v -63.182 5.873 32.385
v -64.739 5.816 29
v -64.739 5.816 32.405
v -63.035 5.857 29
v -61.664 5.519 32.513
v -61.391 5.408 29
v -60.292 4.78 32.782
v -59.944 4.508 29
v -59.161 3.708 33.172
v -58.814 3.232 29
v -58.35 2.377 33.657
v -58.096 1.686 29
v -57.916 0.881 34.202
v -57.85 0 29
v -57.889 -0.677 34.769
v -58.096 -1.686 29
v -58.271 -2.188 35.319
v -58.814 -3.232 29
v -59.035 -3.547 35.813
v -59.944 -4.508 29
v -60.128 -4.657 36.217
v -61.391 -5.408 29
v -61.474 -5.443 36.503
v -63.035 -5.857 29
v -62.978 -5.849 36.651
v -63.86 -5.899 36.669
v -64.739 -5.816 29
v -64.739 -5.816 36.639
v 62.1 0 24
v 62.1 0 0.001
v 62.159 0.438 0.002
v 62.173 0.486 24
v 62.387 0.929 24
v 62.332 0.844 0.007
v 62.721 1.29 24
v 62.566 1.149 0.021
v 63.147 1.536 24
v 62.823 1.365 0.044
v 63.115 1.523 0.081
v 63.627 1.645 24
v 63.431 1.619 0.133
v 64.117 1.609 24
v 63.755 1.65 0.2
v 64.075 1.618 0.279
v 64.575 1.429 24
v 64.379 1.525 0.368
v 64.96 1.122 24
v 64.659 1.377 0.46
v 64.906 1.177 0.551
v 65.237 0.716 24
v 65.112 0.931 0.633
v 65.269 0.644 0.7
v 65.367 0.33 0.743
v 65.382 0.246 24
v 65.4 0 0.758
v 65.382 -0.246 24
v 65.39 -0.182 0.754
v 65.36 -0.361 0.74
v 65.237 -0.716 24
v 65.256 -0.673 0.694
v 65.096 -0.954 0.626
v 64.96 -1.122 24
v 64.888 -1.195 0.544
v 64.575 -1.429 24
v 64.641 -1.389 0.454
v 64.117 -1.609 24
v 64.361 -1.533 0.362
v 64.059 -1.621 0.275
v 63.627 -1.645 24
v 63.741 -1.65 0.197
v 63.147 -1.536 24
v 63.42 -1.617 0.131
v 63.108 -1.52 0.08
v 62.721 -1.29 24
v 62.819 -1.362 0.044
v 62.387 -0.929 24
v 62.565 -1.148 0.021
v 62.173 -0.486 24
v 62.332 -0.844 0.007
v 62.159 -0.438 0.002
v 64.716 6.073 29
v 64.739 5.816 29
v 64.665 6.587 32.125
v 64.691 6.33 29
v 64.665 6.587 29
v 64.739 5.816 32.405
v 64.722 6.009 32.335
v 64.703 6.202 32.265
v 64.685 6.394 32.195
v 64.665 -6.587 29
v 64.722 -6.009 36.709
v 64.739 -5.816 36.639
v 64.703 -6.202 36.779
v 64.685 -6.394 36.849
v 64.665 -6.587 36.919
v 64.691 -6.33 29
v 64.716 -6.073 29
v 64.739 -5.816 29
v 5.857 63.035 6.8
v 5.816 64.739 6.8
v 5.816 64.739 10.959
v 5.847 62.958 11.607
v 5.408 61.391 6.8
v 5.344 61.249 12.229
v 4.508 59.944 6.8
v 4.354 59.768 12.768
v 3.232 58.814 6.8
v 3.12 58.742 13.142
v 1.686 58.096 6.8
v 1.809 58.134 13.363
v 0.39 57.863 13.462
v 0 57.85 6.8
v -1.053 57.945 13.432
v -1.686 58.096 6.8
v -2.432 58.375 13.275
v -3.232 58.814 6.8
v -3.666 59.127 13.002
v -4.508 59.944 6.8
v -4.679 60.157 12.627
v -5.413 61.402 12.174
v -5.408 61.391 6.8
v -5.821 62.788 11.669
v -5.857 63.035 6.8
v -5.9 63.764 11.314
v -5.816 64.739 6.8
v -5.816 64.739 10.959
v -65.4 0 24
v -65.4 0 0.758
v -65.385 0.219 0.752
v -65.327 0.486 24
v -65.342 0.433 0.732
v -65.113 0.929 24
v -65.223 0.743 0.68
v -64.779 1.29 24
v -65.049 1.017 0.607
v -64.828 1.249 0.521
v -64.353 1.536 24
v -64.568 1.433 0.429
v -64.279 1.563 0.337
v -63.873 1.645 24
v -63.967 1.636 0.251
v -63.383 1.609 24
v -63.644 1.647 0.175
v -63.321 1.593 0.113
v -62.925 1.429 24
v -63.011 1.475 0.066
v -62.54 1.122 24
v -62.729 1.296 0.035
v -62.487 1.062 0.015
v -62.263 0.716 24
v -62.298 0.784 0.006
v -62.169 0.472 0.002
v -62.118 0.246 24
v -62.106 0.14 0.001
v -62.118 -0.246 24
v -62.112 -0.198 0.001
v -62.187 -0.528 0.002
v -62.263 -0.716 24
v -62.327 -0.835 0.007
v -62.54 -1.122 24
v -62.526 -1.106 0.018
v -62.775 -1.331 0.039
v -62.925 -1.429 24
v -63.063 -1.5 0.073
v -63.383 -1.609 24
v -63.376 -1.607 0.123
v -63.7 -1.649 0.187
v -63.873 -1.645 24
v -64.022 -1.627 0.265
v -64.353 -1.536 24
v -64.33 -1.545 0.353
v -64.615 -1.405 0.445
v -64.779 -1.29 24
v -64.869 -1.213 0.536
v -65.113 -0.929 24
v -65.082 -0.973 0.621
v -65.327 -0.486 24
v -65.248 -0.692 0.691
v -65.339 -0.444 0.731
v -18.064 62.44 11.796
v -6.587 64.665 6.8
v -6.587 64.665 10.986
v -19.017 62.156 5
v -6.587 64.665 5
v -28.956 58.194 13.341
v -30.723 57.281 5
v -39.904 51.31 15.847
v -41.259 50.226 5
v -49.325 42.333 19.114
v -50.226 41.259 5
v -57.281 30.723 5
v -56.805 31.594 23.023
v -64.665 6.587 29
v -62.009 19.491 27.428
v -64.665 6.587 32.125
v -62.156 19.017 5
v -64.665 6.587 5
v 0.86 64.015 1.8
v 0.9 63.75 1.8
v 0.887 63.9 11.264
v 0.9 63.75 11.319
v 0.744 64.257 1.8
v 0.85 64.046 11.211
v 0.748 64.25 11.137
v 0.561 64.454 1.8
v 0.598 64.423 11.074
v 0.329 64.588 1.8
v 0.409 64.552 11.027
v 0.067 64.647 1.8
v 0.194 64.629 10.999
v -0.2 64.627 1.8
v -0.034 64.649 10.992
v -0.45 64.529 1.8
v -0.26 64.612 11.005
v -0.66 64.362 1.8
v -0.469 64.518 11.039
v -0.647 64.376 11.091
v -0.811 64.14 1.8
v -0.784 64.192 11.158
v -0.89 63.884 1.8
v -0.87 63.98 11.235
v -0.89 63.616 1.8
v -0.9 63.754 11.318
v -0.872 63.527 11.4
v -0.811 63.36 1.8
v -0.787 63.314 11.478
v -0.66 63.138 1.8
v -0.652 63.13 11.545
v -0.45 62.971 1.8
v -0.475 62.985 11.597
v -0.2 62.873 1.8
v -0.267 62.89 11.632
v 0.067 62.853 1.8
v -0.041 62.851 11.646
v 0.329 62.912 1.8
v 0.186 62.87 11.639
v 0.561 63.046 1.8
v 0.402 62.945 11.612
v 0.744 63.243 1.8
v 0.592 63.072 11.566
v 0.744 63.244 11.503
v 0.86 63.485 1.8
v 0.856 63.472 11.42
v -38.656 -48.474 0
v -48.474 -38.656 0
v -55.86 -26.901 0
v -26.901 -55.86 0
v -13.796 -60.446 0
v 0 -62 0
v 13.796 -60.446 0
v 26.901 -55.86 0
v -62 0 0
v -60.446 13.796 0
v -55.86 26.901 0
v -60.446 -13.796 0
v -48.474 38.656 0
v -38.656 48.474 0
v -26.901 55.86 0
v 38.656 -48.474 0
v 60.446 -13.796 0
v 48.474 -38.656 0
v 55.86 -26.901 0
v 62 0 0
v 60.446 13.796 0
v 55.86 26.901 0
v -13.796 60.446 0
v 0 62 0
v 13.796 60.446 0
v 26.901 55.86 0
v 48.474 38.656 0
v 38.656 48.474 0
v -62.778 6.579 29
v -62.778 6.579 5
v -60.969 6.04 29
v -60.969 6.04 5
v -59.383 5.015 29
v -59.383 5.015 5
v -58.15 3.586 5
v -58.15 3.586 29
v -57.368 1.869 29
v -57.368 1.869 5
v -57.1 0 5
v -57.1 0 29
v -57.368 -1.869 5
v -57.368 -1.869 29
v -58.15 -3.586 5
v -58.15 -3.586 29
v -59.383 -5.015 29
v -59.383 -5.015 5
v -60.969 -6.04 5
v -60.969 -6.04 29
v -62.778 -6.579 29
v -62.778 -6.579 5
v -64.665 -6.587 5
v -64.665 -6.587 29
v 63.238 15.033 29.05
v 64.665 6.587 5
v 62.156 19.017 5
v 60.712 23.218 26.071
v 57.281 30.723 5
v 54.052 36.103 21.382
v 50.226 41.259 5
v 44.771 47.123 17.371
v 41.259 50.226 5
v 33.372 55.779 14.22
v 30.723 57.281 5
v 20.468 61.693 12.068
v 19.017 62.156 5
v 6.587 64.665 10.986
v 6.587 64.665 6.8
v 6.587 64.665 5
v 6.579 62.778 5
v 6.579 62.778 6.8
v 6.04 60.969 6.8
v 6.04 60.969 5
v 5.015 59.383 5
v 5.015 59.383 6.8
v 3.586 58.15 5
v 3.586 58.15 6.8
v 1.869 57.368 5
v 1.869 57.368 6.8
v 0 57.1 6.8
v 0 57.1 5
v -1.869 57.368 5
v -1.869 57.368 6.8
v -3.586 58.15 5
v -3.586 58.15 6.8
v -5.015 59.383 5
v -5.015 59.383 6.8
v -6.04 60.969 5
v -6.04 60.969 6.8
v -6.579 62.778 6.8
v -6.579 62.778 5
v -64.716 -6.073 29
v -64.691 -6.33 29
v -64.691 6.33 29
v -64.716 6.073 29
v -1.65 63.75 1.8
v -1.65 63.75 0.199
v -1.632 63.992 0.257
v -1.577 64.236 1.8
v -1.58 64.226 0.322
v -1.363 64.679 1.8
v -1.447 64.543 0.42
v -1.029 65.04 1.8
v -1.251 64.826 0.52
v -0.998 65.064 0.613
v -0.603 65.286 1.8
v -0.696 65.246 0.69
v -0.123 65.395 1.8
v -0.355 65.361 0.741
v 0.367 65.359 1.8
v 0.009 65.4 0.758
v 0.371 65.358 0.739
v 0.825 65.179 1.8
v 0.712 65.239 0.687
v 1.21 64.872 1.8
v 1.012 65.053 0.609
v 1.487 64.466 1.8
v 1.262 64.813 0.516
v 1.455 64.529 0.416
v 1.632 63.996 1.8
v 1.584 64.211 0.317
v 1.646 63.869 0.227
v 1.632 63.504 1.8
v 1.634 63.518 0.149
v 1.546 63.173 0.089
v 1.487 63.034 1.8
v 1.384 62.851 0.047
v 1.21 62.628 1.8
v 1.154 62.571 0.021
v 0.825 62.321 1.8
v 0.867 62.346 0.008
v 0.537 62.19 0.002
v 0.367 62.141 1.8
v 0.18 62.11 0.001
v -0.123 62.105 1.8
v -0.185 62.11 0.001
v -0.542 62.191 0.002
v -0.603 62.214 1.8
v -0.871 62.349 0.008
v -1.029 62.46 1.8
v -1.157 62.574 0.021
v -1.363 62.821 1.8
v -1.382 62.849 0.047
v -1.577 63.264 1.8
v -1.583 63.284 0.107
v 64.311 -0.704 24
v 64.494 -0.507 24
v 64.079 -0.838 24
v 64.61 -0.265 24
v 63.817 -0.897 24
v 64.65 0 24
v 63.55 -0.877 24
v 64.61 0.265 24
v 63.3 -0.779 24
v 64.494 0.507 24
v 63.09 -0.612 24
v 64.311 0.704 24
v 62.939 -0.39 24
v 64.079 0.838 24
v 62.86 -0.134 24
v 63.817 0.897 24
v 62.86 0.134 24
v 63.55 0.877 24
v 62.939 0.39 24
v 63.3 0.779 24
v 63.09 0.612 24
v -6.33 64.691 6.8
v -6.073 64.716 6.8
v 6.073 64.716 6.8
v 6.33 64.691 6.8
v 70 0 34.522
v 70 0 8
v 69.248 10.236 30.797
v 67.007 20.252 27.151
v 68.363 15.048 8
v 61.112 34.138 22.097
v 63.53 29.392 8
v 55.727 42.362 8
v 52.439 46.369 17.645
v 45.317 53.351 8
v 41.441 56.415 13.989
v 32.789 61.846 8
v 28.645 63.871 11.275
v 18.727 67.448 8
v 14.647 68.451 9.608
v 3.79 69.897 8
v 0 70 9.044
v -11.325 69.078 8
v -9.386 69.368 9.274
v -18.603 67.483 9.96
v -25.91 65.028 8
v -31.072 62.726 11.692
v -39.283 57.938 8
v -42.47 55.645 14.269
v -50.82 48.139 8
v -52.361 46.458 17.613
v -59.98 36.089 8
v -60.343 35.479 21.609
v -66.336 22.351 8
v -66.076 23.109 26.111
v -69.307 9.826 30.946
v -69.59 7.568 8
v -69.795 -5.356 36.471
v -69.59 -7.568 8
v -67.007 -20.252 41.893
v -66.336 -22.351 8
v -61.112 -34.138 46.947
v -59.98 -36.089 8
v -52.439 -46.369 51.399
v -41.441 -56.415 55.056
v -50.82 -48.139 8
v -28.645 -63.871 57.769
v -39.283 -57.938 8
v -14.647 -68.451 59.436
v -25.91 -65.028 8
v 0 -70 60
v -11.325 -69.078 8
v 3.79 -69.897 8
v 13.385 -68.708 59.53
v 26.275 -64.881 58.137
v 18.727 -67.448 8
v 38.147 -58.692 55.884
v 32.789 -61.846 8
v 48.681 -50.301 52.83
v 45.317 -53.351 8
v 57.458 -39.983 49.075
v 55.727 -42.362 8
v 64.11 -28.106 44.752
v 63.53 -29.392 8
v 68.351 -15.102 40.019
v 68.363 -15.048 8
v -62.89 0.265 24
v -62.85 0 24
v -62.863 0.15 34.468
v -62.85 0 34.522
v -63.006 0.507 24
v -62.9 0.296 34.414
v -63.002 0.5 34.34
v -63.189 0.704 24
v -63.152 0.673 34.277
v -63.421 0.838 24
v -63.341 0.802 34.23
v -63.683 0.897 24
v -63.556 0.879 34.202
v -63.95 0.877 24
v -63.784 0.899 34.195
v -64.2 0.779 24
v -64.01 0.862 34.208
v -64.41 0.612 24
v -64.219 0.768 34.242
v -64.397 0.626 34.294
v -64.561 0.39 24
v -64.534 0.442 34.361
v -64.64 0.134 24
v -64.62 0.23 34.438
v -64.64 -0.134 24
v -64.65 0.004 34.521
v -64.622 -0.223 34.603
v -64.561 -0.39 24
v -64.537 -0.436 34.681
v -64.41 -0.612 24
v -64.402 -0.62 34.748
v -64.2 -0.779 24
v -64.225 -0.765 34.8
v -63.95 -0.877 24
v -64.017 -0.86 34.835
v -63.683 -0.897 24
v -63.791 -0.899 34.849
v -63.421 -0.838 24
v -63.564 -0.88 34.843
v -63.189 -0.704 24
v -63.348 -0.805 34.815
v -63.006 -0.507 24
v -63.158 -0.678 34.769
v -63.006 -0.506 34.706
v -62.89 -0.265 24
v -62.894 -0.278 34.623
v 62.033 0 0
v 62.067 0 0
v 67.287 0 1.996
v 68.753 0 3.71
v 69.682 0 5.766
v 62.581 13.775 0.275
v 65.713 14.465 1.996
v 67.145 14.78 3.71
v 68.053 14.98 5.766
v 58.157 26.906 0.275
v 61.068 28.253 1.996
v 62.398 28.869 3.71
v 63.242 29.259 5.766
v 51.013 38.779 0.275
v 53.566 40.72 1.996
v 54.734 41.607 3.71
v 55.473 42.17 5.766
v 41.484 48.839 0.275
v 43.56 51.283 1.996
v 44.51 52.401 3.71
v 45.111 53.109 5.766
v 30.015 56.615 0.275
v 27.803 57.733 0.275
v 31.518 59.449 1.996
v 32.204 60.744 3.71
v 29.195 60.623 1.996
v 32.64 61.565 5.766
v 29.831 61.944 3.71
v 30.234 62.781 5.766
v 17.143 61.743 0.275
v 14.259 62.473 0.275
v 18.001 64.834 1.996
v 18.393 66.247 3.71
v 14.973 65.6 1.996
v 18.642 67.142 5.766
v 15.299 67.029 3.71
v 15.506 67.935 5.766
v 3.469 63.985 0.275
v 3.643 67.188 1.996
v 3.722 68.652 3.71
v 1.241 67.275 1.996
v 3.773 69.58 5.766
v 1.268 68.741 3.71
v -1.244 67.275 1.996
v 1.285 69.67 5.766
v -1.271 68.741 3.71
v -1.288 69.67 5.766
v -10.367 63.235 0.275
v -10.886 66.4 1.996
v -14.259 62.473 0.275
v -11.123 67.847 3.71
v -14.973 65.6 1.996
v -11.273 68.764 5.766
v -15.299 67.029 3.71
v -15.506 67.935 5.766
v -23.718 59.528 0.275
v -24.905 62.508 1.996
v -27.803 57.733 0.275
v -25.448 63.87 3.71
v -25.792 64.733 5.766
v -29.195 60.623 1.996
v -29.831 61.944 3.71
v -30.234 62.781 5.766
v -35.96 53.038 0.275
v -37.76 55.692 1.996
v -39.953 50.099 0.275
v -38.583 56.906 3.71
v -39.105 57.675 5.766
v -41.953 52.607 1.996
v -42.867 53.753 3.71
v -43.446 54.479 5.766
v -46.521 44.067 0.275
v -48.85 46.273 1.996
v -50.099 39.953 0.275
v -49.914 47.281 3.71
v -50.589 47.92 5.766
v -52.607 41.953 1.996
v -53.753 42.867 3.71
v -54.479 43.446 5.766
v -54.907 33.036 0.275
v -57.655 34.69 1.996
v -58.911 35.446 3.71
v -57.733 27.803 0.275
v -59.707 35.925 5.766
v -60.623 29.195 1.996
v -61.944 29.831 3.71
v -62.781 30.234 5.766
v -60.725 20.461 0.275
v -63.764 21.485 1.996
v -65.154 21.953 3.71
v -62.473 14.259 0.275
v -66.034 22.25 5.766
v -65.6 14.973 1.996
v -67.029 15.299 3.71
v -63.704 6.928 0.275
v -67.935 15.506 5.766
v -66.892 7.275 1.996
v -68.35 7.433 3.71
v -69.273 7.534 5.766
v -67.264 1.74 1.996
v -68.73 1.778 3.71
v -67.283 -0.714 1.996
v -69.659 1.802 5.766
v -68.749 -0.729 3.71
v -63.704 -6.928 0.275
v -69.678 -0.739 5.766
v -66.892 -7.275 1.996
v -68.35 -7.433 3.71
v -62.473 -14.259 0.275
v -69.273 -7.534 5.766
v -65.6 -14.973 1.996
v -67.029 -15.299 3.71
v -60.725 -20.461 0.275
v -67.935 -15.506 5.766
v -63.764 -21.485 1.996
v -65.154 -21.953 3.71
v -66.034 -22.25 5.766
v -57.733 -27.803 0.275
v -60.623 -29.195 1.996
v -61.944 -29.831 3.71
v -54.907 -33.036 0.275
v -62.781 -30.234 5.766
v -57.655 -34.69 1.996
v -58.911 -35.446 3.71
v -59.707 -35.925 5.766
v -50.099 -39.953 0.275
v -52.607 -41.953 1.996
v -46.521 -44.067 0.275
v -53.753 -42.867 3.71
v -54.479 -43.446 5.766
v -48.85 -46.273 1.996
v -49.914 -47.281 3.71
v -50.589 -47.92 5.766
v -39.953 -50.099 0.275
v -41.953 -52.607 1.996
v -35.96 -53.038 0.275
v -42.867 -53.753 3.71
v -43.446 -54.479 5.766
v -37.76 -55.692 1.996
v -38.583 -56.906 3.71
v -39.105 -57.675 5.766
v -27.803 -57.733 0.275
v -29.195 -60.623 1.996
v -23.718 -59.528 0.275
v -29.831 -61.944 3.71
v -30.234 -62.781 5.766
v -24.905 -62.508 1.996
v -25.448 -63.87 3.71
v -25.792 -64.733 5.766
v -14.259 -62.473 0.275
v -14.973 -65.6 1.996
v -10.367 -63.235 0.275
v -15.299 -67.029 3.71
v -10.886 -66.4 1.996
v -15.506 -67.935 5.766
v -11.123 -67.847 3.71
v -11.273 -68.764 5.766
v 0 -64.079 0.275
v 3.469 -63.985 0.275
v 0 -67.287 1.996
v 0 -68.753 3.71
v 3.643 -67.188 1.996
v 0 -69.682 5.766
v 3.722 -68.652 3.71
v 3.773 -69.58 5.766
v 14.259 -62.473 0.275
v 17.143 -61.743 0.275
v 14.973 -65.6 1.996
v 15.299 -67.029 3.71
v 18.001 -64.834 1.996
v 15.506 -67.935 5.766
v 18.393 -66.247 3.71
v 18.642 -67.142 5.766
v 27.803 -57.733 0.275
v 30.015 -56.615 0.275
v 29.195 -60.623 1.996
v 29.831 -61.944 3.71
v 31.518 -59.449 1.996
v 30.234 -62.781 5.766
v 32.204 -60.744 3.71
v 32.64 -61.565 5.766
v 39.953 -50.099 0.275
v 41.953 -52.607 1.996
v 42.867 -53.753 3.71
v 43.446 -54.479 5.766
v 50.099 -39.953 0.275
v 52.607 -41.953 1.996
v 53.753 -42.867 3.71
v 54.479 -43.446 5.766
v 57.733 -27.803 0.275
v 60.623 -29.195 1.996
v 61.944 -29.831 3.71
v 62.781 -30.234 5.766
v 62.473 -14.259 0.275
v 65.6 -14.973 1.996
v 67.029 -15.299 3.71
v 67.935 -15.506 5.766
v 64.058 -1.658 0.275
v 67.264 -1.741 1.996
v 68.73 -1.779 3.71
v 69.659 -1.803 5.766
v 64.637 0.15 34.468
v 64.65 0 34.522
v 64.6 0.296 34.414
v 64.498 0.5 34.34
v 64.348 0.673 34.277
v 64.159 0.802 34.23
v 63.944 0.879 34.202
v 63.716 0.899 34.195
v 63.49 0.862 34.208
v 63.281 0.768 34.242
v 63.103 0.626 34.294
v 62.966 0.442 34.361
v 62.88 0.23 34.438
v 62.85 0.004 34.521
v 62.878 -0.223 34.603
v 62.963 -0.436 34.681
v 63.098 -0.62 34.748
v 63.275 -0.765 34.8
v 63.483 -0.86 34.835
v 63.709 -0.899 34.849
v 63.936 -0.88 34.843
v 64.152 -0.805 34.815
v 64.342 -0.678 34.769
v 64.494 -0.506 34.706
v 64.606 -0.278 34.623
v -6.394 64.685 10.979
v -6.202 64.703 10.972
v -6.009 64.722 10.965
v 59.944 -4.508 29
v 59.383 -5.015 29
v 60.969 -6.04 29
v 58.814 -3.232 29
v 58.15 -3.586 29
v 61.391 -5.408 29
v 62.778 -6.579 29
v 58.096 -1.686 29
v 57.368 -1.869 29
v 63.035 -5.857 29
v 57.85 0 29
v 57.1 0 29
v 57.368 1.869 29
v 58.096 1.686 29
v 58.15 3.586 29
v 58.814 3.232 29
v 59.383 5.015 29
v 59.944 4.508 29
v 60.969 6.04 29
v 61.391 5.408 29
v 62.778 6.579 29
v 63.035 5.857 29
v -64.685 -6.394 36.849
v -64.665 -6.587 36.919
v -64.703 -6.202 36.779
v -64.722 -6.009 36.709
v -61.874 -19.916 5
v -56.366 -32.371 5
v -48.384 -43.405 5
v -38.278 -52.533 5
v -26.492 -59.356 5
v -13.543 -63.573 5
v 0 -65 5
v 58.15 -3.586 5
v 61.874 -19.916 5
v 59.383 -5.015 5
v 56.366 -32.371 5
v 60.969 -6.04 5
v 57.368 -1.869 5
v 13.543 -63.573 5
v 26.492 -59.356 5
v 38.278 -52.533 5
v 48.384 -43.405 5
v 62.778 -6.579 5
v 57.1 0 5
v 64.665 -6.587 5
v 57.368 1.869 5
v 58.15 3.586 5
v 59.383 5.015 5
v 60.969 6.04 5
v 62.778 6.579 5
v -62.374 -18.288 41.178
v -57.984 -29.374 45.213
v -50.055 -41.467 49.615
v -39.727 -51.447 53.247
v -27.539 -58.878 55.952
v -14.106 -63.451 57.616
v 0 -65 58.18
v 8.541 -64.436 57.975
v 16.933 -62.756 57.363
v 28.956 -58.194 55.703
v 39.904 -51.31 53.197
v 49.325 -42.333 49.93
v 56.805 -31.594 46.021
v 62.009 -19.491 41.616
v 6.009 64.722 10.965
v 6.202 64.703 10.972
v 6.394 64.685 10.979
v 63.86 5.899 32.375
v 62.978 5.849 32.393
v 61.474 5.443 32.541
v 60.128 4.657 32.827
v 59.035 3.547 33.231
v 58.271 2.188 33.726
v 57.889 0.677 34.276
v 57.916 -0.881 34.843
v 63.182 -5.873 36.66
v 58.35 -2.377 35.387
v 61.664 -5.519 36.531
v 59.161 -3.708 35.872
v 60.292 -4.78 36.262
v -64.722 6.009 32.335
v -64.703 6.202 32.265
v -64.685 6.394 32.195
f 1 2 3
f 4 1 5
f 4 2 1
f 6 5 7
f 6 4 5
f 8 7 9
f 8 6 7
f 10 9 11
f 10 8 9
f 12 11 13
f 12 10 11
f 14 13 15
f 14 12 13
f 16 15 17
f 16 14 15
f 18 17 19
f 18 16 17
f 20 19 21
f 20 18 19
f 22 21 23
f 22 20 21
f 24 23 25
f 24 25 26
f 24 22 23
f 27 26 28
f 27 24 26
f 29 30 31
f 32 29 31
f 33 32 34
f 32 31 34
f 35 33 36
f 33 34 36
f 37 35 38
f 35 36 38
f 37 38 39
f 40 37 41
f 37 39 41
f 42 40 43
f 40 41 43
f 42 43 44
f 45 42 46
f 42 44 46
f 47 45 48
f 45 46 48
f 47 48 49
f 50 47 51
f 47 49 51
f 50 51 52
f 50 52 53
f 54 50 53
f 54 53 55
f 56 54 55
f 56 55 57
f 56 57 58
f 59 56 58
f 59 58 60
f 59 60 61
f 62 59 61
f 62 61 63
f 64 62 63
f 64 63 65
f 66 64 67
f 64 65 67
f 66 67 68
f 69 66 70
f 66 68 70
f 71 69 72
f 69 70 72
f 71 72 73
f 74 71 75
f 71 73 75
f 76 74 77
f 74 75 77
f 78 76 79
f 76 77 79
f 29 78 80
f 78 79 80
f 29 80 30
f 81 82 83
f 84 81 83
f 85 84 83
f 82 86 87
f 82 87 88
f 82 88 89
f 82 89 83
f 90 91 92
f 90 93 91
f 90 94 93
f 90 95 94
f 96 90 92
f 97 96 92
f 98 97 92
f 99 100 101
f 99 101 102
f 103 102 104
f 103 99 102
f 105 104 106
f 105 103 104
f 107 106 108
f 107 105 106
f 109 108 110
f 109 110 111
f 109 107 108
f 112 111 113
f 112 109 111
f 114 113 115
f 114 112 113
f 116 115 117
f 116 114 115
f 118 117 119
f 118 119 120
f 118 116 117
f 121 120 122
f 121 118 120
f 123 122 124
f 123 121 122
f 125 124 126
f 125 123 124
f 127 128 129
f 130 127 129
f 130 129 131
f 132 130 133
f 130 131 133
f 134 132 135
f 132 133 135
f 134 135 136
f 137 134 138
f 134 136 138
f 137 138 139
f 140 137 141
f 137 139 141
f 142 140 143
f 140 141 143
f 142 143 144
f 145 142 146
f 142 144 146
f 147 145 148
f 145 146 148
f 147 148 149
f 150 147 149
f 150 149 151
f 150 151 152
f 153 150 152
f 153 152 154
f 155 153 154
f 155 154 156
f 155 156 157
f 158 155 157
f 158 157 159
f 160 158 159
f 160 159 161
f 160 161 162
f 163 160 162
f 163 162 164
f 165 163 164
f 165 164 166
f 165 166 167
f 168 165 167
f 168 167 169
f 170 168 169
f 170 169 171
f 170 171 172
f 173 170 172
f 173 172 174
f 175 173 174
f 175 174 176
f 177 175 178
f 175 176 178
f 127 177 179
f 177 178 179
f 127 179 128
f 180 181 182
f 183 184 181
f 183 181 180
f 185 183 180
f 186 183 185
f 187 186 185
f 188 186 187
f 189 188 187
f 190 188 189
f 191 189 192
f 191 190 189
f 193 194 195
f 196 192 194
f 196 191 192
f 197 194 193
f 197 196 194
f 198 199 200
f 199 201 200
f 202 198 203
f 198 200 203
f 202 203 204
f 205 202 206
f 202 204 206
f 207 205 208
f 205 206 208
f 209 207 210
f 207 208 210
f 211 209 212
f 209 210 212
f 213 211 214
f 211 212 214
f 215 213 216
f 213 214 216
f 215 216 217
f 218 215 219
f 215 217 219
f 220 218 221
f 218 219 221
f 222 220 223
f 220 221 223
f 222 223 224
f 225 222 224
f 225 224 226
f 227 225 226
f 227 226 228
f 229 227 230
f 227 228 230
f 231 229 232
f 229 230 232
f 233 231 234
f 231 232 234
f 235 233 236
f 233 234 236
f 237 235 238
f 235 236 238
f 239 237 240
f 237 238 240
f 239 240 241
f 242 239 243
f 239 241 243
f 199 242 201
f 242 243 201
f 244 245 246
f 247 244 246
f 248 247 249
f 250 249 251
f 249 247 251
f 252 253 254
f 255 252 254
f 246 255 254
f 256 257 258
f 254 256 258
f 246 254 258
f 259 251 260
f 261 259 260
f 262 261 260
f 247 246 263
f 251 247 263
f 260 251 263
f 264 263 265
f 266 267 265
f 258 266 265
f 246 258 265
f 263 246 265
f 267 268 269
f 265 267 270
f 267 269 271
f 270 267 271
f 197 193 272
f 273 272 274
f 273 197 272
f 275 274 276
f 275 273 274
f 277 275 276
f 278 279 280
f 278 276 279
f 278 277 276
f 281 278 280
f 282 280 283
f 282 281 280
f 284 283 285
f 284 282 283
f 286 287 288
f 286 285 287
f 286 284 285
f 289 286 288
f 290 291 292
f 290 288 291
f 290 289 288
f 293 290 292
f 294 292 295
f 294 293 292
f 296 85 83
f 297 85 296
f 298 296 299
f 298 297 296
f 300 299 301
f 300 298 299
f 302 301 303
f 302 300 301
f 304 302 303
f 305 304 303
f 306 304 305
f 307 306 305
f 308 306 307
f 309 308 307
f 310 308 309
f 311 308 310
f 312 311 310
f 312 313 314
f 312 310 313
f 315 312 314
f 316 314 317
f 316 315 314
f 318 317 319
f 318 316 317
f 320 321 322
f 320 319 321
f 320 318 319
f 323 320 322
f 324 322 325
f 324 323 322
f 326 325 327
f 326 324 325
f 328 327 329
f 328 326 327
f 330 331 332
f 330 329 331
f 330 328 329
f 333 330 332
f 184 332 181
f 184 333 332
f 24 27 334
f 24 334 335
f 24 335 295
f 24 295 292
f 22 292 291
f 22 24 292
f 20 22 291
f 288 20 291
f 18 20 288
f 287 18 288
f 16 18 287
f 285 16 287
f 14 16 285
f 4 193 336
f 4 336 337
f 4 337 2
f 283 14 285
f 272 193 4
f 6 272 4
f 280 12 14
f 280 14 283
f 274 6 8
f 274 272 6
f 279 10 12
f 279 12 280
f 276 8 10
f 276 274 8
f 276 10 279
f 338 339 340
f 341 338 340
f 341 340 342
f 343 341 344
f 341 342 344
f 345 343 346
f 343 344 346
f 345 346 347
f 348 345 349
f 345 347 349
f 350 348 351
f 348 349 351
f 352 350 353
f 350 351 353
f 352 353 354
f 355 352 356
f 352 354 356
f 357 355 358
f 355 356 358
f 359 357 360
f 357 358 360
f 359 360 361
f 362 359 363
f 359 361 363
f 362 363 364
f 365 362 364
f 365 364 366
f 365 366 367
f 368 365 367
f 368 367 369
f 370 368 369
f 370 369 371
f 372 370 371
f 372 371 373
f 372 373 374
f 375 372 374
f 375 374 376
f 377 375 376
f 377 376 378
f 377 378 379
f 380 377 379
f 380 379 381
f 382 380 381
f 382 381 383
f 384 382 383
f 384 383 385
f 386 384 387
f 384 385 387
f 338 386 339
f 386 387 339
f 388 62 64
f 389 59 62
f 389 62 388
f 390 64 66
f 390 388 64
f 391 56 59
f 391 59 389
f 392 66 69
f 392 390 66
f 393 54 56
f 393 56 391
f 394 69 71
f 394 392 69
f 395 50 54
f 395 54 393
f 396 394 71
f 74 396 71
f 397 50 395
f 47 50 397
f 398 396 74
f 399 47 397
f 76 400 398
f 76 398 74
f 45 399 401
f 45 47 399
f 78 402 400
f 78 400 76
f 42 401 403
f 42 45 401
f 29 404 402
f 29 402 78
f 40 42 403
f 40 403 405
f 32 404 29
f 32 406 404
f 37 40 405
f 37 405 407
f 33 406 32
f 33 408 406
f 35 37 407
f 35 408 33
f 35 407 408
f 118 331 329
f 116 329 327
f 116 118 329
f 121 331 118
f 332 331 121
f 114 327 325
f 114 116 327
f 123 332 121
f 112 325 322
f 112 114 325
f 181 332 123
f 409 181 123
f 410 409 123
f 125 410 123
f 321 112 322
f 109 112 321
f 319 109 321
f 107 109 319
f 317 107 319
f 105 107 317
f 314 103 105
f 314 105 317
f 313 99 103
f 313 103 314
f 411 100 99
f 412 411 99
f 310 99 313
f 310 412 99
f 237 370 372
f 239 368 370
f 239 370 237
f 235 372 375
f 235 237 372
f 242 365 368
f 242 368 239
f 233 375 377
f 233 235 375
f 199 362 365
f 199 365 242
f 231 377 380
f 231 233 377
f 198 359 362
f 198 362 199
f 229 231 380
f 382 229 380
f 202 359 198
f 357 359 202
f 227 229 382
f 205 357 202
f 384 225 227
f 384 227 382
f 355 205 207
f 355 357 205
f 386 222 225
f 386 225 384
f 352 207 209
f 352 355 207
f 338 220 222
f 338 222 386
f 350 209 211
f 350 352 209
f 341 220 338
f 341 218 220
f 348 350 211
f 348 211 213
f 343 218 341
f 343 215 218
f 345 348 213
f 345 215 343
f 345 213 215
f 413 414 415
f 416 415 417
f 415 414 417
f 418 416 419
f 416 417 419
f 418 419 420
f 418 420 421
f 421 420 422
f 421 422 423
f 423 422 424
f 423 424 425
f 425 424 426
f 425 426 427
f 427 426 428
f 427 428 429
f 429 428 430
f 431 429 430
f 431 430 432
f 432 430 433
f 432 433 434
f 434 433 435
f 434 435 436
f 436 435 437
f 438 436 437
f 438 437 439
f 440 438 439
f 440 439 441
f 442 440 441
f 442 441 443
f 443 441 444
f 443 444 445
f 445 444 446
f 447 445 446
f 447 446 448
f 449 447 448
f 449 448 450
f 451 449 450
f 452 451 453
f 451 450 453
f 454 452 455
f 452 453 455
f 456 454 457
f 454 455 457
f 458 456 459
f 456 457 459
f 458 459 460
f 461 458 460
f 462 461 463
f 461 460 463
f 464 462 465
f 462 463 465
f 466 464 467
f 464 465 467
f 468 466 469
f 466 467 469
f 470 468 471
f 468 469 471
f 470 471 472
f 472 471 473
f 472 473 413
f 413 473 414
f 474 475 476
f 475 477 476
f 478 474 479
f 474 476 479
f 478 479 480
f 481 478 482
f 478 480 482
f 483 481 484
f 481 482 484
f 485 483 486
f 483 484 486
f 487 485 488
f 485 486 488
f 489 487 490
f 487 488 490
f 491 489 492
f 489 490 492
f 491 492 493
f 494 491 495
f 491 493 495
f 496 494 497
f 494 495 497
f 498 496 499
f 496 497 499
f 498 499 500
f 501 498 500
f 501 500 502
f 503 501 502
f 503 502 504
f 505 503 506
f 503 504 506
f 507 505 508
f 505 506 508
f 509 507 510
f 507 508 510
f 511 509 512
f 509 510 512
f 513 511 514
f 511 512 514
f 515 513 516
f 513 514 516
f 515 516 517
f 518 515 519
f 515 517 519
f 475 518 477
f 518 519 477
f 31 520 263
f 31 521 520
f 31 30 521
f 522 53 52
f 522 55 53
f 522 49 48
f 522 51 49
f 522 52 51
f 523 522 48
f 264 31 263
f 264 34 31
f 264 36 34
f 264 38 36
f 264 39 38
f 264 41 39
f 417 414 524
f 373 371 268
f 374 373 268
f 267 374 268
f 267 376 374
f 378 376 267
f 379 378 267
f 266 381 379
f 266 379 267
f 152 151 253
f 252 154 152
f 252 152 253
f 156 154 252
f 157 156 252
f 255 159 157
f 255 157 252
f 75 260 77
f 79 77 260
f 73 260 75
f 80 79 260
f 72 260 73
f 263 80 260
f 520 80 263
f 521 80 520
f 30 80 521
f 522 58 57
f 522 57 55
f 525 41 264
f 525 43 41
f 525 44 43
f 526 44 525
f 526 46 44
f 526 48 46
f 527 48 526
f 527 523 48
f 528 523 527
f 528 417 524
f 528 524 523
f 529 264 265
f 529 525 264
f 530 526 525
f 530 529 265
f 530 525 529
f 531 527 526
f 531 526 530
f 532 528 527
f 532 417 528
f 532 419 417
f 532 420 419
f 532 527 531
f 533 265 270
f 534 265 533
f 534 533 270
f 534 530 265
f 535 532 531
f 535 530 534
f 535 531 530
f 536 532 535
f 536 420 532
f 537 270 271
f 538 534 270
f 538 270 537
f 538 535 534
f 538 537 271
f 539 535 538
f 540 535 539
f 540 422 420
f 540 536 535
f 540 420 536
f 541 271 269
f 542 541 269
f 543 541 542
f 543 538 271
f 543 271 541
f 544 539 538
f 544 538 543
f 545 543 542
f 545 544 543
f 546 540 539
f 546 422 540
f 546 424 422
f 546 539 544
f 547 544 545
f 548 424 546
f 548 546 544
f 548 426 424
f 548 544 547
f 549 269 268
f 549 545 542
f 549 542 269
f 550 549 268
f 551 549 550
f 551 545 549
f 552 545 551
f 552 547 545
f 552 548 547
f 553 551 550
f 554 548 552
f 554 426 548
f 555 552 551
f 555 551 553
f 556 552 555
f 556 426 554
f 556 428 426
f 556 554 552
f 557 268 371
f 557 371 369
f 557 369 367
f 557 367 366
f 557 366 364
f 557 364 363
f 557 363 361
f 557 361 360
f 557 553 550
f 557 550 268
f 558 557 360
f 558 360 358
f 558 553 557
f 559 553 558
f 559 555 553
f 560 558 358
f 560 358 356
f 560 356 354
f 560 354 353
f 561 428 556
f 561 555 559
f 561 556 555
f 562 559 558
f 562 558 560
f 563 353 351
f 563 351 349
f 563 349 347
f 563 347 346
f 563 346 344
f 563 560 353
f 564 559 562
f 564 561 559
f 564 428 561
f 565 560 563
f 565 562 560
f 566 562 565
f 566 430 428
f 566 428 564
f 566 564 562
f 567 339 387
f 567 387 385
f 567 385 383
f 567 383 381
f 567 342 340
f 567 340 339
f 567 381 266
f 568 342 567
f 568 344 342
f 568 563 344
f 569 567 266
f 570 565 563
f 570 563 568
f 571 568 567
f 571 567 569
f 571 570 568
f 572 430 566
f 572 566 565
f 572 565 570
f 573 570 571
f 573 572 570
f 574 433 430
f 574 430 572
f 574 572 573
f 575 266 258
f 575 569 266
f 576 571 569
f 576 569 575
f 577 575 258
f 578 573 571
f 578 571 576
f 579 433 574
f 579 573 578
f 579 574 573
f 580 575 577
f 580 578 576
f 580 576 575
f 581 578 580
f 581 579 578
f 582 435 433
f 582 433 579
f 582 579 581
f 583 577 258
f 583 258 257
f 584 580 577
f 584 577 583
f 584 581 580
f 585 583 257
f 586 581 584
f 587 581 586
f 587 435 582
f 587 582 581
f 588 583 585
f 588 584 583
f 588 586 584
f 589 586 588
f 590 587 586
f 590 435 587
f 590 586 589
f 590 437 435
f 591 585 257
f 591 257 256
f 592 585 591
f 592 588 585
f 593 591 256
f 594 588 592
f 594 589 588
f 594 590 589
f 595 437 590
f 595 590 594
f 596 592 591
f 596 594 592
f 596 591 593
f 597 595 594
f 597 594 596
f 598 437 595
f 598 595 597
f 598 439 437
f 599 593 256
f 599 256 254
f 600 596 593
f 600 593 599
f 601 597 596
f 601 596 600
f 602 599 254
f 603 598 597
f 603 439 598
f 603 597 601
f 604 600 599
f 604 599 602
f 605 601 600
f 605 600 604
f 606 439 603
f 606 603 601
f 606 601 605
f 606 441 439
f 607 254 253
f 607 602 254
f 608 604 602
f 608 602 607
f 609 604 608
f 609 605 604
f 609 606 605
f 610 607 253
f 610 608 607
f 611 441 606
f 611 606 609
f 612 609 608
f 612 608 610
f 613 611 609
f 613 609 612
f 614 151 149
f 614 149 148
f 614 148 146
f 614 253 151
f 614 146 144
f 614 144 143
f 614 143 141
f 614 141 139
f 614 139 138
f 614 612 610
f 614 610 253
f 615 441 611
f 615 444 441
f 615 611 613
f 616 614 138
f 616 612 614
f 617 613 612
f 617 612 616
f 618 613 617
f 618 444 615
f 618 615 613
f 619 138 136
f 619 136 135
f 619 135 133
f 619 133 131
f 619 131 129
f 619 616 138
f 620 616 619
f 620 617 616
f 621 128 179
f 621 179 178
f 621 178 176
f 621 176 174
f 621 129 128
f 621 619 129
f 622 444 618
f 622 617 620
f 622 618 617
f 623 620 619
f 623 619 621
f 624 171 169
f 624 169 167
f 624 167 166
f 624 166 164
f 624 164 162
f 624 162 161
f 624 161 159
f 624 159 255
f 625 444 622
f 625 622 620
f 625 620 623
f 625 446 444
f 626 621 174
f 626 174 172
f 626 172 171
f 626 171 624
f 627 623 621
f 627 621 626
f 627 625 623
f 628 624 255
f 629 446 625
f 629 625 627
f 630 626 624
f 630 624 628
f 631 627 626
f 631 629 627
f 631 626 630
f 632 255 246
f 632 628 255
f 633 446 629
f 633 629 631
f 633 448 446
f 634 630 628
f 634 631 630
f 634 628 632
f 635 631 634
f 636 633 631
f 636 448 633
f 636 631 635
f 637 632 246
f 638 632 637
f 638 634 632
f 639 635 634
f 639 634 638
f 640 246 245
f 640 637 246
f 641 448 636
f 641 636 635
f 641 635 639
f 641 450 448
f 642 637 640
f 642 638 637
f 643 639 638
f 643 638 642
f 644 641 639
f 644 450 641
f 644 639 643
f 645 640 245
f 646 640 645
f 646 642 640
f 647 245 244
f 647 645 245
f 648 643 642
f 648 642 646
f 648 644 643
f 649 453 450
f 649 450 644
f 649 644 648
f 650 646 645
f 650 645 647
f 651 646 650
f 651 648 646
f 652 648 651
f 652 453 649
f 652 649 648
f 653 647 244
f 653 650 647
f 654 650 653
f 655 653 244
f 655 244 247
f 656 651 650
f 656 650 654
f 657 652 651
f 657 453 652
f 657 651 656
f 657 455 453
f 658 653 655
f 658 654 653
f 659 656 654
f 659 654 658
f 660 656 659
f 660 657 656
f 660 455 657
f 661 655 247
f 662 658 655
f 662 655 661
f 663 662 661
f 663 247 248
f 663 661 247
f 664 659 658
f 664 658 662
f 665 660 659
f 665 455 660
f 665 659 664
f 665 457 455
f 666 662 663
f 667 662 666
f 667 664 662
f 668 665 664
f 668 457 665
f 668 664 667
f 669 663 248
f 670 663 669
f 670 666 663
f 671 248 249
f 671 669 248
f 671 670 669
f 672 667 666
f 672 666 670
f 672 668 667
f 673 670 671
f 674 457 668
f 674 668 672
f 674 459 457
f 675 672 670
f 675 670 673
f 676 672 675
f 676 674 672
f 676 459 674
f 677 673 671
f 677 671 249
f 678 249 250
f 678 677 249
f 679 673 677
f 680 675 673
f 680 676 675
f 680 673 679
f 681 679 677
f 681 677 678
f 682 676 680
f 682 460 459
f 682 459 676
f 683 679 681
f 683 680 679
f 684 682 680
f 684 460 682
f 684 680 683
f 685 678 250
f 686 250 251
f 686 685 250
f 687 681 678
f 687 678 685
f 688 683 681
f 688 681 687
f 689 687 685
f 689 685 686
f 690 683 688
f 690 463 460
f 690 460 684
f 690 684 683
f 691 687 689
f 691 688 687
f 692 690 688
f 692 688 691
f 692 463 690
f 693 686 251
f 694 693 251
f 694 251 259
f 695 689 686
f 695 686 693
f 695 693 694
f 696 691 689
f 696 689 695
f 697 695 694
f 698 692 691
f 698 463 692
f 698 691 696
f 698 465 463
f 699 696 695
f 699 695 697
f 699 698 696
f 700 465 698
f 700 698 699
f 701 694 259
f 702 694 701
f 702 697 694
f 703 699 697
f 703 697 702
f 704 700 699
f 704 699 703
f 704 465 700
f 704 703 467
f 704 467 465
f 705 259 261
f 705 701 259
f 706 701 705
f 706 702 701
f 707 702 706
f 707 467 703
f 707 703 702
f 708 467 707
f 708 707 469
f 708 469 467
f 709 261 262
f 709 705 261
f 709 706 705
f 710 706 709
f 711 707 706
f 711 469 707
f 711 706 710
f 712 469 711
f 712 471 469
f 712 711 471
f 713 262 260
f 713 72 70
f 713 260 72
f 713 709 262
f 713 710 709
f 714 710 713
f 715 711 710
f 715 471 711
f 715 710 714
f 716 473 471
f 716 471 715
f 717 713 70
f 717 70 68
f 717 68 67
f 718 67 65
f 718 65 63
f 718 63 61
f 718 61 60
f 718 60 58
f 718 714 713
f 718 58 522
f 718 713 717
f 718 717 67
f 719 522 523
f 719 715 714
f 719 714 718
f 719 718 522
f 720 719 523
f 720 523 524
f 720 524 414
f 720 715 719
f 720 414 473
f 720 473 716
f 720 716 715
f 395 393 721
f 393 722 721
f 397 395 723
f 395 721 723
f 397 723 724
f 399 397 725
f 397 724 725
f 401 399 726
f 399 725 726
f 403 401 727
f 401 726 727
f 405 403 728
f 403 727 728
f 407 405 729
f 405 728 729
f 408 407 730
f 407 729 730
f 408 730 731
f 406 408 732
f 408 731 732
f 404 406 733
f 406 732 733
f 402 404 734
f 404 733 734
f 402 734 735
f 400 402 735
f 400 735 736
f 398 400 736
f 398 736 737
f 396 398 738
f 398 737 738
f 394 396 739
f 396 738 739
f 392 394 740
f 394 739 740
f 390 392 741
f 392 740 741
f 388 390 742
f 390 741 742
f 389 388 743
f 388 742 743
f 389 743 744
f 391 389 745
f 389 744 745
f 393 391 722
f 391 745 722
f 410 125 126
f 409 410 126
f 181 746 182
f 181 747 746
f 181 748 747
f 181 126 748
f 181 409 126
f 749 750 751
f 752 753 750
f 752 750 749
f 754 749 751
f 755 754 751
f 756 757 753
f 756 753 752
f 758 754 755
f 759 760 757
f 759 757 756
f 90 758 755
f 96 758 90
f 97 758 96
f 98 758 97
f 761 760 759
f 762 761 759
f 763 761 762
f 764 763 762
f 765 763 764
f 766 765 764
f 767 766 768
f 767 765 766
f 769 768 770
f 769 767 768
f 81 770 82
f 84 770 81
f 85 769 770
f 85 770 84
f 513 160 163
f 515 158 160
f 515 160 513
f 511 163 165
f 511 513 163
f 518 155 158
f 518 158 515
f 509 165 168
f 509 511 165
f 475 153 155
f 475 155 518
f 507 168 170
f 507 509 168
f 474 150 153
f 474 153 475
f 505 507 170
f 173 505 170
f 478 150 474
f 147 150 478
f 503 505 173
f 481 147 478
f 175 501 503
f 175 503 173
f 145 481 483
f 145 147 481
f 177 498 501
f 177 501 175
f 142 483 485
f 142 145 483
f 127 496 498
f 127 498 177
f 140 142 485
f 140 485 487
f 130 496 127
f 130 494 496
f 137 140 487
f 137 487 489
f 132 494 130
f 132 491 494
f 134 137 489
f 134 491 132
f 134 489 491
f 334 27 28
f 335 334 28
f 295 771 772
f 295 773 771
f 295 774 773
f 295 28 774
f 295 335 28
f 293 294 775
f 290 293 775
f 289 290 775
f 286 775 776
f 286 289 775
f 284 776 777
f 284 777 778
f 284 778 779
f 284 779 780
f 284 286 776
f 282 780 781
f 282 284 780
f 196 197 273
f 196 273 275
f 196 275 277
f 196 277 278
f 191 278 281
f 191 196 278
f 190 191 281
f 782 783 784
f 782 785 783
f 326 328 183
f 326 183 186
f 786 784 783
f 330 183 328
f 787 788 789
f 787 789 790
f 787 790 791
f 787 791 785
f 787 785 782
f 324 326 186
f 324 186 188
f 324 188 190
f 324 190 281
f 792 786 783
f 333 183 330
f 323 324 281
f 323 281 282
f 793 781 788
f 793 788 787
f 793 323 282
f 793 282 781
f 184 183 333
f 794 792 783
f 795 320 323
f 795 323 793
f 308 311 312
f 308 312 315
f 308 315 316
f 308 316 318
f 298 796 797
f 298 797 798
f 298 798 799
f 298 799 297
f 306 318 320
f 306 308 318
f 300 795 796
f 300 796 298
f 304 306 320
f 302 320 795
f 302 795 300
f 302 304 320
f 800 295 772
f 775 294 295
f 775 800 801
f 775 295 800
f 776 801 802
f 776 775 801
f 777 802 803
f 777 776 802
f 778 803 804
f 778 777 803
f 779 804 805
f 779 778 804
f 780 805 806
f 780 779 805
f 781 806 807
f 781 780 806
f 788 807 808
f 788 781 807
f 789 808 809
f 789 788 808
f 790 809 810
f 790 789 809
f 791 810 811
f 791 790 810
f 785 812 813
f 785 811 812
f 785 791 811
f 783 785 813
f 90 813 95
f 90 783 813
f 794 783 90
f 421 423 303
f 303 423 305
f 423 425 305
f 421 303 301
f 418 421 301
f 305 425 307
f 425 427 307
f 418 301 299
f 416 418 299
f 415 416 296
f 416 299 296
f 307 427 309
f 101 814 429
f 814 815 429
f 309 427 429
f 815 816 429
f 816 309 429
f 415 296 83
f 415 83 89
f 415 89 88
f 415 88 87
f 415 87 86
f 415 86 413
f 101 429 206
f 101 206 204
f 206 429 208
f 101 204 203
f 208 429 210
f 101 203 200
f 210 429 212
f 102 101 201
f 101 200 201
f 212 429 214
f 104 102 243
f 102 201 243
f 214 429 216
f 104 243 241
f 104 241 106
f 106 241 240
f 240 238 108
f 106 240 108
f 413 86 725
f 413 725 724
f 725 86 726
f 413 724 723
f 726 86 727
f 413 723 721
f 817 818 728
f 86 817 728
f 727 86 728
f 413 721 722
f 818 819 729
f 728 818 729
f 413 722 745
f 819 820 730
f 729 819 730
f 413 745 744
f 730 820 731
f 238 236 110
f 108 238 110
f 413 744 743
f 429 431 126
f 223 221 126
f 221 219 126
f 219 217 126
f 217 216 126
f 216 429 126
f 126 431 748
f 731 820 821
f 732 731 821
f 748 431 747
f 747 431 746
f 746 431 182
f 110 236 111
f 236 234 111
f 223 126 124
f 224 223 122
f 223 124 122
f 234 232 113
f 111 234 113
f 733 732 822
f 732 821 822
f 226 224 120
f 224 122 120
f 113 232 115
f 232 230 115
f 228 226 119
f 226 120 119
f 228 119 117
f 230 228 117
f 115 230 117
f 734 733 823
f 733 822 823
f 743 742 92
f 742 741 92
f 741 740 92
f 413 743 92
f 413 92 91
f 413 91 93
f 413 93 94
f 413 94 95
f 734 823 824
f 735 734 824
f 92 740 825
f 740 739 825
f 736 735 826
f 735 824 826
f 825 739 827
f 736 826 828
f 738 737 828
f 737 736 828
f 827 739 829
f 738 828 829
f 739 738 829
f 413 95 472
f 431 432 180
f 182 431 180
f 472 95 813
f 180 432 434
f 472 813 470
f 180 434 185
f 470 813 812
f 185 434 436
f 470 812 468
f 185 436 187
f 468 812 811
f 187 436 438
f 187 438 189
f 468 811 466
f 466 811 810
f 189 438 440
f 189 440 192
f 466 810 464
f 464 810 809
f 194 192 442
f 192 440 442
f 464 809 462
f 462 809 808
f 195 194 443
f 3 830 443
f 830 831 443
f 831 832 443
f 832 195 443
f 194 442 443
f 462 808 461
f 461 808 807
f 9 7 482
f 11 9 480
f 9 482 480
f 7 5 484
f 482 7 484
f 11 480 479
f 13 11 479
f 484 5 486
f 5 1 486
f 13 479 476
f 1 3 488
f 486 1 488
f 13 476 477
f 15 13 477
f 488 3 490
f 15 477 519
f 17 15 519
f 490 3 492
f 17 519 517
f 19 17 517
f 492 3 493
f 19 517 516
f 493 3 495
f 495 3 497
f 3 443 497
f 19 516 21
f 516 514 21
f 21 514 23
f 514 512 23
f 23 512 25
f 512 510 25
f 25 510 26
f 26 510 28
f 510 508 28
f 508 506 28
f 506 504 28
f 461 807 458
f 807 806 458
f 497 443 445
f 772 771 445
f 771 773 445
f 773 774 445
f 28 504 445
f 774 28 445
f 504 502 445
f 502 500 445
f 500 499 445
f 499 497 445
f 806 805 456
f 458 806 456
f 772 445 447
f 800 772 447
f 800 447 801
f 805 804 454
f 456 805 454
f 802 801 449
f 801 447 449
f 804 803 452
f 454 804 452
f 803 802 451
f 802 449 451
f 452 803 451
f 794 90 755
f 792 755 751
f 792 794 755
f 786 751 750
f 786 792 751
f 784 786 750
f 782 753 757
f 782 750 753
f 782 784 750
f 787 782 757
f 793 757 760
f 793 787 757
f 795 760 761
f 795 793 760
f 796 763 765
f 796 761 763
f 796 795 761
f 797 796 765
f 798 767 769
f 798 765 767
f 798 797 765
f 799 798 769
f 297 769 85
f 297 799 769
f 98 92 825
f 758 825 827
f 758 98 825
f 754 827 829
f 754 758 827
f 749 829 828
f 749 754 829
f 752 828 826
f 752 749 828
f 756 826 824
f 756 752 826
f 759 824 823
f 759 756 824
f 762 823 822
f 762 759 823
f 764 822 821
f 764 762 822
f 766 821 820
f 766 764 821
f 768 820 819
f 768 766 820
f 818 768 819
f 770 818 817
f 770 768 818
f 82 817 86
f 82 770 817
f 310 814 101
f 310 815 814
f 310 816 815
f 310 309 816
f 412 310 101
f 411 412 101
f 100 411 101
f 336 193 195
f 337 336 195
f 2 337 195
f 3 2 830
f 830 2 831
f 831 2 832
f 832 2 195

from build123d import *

# Parameters (mm, degrees)
SKETCH_1_R                = 70
EXTRUDE_1_DEPTH           = 60
CUT_EXTRUDE_1_DEPTH       = 116.758369028
CUT_EXTRUDE_1_DEPTH_BACK  = 116.758369028
HOLE_WIZARD_1_D           = 1.8
HOLE_WIZARD_1_CBORE_D     = 3.3
HOLE_WIZARD_1_CBORE_DEPTH = 1.8
HOLE_WIZARD_2_D           = 1.8
HOLE_WIZARD_2_CBORE_D     = 3.3
HOLE_WIZARD_2_CBORE_DEPTH = 24
SHELL_START               = 5
SHELL_1_DEPTH             = 53.180148829
SHELL_START_2             = 29
SHELL_1_2_DEPTH           = 29.180148829
SHELL_START_3             = 6.8
SHELL_1_3_DEPTH           = 22.2
FILLET_2_R                = 8


# Read off the part's stored shape, not the designer's step: 抽壳1
with BuildPart() as part:
    # 草图1 → 凸台-拉伸1 (new body)
    with BuildSketch(Plane.XY):
        Circle(SKETCH_1_R)
    extrude(amount=EXTRUDE_1_DEPTH)

    # 草图2 → 切除-拉伸1 (cut, two sides: drawn at the far end of the back side and taken through both)
    with BuildSketch(Plane(origin=(0, 0, 0), x_dir=(0, 0, -1), z_dir=(1, 0, 0)).offset(-CUT_EXTRUDE_1_DEPTH_BACK)):
        Polygon((-60, -70), (-60, 70), (-9.044167203, 70), align=None)
    extrude(amount=CUT_EXTRUDE_1_DEPTH + CUT_EXTRUDE_1_DEPTH_BACK, mode=Mode.SUBTRACT)

    # 打孔尺寸(%根据)内六角圆柱头螺钉的类型1 (through all)
    with Locations(Plane(origin=(0, 0, 0), x_dir=(-1, 0, 0), z_dir=(0, 0, -1))):
        with Locations((0, 63.75)):
            CounterBoreHole(HOLE_WIZARD_1_D / 2, HOLE_WIZARD_1_CBORE_D / 2, HOLE_WIZARD_1_CBORE_DEPTH)

    # 打孔尺寸(%根据)内六角圆柱头螺钉的类型2 (through all)
    with Locations(Plane(origin=(0, 0, 0), x_dir=(-1, 0, 0), z_dir=(0, 0, -1))):
        with Locations((-63.75, 0), (63.75, 0)):
            CounterBoreHole(HOLE_WIZARD_2_D / 2, HOLE_WIZARD_2_CBORE_D / 2, HOLE_WIZARD_2_CBORE_DEPTH)

    # 抽壳1 outline → 抽壳1 (cut)
    with BuildSketch(Plane.XY.offset(SHELL_START)):
        with BuildLine():
            ThreePointArc((-64.665411765, -6.586692744), (0, -65), (64.665411765, -6.586692744))
            ThreePointArc((64.665411765, -6.586692744), (57.1, 0), (64.665411765, 6.586692744))
            ThreePointArc((64.665411765, 6.586692744), (45.961940777, 45.961940777), (6.586692744, 64.665411765))
            ThreePointArc((6.586692744, 64.665411765), (0, 57.1), (-6.586692744, 64.665411765))
            ThreePointArc((-6.586692744, 64.665411765), (-45.961940777, 45.961940777), (-64.665411765, 6.586692744))
            ThreePointArc((-64.665411765, 6.586692744), (-57.1, 0), (-64.665411765, -6.586692744))
        make_face()
    extrude(amount=SHELL_1_DEPTH, mode=Mode.SUBTRACT)

    # Shell 1 2 outline → Shell 1 2 (cut)
    with BuildSketch(Plane.XY.offset(SHELL_START_2)):
        with BuildLine():
            ThreePointArc((64.665411765, -6.586692744), (64.703469597, -6.2016951), (64.739235294, -5.81647776))
            ThreePointArc((64.739235294, -5.81647776), (57.85, 0), (64.739235294, 5.81647776))
            ThreePointArc((64.739235294, 5.81647776), (64.703469597, 6.2016951), (64.665411765, 6.586692744))
            ThreePointArc((64.665411765, 6.586692744), (57.1, 0), (64.665411765, -6.586692744))
        make_face()
        with BuildLine():
            ThreePointArc((-64.739235294, -5.81647776), (-64.703469597, -6.2016951), (-64.665411765, -6.586692744))
            ThreePointArc((-64.665411765, -6.586692744), (-57.1, 0), (-64.665411765, 6.586692744))
            ThreePointArc((-64.665411765, 6.586692744), (-64.703469597, 6.2016951), (-64.739235294, 5.81647776))
            ThreePointArc((-64.739235294, 5.81647776), (-57.85, 0), (-64.739235294, -5.81647776))
        make_face()
    extrude(amount=SHELL_1_2_DEPTH, mode=Mode.SUBTRACT)

    # Shell 1 3 outline → Shell 1 3 (cut)
    with BuildSketch(Plane.XY.offset(SHELL_START_3)):
        with BuildLine():
            ThreePointArc((-6.586692744, 64.665411765), (0, 57.1), (6.586692744, 64.665411765))
            ThreePointArc((6.586692744, 64.665411765), (6.2016951, 64.703469597), (5.81647776, 64.739235294))
            ThreePointArc((5.81647776, 64.739235294), (0, 57.85), (-5.81647776, 64.739235294))
            ThreePointArc((-5.81647776, 64.739235294), (-6.2016951, 64.703469597), (-6.586692744, 64.665411765))
        make_face()
    extrude(amount=SHELL_1_3_DEPTH, mode=Mode.SUBTRACT)

    # 圆角2
    # the kernel refuses this fillet: 8 mm, written as the material it takes off along each edge
    with BuildSketch(Plane(origin=(0, 0, 0), x_dir=(1, 0, 0), z_dir=(0, -1, 0))) as fillet_2_piece_1:
        with BuildLine():
            CenterArc((70 - FILLET_2_R, FILLET_2_R), FILLET_2_R, 270, 90)
            Line((70 - FILLET_2_R, 0), (70, 0))
            Line((70, 0), (70, FILLET_2_R))
        make_face()
    revolve(axis=Axis((0, 0, 0), (0, 0, 1)), mode=Mode.SUBTRACT)


solid = part.part
